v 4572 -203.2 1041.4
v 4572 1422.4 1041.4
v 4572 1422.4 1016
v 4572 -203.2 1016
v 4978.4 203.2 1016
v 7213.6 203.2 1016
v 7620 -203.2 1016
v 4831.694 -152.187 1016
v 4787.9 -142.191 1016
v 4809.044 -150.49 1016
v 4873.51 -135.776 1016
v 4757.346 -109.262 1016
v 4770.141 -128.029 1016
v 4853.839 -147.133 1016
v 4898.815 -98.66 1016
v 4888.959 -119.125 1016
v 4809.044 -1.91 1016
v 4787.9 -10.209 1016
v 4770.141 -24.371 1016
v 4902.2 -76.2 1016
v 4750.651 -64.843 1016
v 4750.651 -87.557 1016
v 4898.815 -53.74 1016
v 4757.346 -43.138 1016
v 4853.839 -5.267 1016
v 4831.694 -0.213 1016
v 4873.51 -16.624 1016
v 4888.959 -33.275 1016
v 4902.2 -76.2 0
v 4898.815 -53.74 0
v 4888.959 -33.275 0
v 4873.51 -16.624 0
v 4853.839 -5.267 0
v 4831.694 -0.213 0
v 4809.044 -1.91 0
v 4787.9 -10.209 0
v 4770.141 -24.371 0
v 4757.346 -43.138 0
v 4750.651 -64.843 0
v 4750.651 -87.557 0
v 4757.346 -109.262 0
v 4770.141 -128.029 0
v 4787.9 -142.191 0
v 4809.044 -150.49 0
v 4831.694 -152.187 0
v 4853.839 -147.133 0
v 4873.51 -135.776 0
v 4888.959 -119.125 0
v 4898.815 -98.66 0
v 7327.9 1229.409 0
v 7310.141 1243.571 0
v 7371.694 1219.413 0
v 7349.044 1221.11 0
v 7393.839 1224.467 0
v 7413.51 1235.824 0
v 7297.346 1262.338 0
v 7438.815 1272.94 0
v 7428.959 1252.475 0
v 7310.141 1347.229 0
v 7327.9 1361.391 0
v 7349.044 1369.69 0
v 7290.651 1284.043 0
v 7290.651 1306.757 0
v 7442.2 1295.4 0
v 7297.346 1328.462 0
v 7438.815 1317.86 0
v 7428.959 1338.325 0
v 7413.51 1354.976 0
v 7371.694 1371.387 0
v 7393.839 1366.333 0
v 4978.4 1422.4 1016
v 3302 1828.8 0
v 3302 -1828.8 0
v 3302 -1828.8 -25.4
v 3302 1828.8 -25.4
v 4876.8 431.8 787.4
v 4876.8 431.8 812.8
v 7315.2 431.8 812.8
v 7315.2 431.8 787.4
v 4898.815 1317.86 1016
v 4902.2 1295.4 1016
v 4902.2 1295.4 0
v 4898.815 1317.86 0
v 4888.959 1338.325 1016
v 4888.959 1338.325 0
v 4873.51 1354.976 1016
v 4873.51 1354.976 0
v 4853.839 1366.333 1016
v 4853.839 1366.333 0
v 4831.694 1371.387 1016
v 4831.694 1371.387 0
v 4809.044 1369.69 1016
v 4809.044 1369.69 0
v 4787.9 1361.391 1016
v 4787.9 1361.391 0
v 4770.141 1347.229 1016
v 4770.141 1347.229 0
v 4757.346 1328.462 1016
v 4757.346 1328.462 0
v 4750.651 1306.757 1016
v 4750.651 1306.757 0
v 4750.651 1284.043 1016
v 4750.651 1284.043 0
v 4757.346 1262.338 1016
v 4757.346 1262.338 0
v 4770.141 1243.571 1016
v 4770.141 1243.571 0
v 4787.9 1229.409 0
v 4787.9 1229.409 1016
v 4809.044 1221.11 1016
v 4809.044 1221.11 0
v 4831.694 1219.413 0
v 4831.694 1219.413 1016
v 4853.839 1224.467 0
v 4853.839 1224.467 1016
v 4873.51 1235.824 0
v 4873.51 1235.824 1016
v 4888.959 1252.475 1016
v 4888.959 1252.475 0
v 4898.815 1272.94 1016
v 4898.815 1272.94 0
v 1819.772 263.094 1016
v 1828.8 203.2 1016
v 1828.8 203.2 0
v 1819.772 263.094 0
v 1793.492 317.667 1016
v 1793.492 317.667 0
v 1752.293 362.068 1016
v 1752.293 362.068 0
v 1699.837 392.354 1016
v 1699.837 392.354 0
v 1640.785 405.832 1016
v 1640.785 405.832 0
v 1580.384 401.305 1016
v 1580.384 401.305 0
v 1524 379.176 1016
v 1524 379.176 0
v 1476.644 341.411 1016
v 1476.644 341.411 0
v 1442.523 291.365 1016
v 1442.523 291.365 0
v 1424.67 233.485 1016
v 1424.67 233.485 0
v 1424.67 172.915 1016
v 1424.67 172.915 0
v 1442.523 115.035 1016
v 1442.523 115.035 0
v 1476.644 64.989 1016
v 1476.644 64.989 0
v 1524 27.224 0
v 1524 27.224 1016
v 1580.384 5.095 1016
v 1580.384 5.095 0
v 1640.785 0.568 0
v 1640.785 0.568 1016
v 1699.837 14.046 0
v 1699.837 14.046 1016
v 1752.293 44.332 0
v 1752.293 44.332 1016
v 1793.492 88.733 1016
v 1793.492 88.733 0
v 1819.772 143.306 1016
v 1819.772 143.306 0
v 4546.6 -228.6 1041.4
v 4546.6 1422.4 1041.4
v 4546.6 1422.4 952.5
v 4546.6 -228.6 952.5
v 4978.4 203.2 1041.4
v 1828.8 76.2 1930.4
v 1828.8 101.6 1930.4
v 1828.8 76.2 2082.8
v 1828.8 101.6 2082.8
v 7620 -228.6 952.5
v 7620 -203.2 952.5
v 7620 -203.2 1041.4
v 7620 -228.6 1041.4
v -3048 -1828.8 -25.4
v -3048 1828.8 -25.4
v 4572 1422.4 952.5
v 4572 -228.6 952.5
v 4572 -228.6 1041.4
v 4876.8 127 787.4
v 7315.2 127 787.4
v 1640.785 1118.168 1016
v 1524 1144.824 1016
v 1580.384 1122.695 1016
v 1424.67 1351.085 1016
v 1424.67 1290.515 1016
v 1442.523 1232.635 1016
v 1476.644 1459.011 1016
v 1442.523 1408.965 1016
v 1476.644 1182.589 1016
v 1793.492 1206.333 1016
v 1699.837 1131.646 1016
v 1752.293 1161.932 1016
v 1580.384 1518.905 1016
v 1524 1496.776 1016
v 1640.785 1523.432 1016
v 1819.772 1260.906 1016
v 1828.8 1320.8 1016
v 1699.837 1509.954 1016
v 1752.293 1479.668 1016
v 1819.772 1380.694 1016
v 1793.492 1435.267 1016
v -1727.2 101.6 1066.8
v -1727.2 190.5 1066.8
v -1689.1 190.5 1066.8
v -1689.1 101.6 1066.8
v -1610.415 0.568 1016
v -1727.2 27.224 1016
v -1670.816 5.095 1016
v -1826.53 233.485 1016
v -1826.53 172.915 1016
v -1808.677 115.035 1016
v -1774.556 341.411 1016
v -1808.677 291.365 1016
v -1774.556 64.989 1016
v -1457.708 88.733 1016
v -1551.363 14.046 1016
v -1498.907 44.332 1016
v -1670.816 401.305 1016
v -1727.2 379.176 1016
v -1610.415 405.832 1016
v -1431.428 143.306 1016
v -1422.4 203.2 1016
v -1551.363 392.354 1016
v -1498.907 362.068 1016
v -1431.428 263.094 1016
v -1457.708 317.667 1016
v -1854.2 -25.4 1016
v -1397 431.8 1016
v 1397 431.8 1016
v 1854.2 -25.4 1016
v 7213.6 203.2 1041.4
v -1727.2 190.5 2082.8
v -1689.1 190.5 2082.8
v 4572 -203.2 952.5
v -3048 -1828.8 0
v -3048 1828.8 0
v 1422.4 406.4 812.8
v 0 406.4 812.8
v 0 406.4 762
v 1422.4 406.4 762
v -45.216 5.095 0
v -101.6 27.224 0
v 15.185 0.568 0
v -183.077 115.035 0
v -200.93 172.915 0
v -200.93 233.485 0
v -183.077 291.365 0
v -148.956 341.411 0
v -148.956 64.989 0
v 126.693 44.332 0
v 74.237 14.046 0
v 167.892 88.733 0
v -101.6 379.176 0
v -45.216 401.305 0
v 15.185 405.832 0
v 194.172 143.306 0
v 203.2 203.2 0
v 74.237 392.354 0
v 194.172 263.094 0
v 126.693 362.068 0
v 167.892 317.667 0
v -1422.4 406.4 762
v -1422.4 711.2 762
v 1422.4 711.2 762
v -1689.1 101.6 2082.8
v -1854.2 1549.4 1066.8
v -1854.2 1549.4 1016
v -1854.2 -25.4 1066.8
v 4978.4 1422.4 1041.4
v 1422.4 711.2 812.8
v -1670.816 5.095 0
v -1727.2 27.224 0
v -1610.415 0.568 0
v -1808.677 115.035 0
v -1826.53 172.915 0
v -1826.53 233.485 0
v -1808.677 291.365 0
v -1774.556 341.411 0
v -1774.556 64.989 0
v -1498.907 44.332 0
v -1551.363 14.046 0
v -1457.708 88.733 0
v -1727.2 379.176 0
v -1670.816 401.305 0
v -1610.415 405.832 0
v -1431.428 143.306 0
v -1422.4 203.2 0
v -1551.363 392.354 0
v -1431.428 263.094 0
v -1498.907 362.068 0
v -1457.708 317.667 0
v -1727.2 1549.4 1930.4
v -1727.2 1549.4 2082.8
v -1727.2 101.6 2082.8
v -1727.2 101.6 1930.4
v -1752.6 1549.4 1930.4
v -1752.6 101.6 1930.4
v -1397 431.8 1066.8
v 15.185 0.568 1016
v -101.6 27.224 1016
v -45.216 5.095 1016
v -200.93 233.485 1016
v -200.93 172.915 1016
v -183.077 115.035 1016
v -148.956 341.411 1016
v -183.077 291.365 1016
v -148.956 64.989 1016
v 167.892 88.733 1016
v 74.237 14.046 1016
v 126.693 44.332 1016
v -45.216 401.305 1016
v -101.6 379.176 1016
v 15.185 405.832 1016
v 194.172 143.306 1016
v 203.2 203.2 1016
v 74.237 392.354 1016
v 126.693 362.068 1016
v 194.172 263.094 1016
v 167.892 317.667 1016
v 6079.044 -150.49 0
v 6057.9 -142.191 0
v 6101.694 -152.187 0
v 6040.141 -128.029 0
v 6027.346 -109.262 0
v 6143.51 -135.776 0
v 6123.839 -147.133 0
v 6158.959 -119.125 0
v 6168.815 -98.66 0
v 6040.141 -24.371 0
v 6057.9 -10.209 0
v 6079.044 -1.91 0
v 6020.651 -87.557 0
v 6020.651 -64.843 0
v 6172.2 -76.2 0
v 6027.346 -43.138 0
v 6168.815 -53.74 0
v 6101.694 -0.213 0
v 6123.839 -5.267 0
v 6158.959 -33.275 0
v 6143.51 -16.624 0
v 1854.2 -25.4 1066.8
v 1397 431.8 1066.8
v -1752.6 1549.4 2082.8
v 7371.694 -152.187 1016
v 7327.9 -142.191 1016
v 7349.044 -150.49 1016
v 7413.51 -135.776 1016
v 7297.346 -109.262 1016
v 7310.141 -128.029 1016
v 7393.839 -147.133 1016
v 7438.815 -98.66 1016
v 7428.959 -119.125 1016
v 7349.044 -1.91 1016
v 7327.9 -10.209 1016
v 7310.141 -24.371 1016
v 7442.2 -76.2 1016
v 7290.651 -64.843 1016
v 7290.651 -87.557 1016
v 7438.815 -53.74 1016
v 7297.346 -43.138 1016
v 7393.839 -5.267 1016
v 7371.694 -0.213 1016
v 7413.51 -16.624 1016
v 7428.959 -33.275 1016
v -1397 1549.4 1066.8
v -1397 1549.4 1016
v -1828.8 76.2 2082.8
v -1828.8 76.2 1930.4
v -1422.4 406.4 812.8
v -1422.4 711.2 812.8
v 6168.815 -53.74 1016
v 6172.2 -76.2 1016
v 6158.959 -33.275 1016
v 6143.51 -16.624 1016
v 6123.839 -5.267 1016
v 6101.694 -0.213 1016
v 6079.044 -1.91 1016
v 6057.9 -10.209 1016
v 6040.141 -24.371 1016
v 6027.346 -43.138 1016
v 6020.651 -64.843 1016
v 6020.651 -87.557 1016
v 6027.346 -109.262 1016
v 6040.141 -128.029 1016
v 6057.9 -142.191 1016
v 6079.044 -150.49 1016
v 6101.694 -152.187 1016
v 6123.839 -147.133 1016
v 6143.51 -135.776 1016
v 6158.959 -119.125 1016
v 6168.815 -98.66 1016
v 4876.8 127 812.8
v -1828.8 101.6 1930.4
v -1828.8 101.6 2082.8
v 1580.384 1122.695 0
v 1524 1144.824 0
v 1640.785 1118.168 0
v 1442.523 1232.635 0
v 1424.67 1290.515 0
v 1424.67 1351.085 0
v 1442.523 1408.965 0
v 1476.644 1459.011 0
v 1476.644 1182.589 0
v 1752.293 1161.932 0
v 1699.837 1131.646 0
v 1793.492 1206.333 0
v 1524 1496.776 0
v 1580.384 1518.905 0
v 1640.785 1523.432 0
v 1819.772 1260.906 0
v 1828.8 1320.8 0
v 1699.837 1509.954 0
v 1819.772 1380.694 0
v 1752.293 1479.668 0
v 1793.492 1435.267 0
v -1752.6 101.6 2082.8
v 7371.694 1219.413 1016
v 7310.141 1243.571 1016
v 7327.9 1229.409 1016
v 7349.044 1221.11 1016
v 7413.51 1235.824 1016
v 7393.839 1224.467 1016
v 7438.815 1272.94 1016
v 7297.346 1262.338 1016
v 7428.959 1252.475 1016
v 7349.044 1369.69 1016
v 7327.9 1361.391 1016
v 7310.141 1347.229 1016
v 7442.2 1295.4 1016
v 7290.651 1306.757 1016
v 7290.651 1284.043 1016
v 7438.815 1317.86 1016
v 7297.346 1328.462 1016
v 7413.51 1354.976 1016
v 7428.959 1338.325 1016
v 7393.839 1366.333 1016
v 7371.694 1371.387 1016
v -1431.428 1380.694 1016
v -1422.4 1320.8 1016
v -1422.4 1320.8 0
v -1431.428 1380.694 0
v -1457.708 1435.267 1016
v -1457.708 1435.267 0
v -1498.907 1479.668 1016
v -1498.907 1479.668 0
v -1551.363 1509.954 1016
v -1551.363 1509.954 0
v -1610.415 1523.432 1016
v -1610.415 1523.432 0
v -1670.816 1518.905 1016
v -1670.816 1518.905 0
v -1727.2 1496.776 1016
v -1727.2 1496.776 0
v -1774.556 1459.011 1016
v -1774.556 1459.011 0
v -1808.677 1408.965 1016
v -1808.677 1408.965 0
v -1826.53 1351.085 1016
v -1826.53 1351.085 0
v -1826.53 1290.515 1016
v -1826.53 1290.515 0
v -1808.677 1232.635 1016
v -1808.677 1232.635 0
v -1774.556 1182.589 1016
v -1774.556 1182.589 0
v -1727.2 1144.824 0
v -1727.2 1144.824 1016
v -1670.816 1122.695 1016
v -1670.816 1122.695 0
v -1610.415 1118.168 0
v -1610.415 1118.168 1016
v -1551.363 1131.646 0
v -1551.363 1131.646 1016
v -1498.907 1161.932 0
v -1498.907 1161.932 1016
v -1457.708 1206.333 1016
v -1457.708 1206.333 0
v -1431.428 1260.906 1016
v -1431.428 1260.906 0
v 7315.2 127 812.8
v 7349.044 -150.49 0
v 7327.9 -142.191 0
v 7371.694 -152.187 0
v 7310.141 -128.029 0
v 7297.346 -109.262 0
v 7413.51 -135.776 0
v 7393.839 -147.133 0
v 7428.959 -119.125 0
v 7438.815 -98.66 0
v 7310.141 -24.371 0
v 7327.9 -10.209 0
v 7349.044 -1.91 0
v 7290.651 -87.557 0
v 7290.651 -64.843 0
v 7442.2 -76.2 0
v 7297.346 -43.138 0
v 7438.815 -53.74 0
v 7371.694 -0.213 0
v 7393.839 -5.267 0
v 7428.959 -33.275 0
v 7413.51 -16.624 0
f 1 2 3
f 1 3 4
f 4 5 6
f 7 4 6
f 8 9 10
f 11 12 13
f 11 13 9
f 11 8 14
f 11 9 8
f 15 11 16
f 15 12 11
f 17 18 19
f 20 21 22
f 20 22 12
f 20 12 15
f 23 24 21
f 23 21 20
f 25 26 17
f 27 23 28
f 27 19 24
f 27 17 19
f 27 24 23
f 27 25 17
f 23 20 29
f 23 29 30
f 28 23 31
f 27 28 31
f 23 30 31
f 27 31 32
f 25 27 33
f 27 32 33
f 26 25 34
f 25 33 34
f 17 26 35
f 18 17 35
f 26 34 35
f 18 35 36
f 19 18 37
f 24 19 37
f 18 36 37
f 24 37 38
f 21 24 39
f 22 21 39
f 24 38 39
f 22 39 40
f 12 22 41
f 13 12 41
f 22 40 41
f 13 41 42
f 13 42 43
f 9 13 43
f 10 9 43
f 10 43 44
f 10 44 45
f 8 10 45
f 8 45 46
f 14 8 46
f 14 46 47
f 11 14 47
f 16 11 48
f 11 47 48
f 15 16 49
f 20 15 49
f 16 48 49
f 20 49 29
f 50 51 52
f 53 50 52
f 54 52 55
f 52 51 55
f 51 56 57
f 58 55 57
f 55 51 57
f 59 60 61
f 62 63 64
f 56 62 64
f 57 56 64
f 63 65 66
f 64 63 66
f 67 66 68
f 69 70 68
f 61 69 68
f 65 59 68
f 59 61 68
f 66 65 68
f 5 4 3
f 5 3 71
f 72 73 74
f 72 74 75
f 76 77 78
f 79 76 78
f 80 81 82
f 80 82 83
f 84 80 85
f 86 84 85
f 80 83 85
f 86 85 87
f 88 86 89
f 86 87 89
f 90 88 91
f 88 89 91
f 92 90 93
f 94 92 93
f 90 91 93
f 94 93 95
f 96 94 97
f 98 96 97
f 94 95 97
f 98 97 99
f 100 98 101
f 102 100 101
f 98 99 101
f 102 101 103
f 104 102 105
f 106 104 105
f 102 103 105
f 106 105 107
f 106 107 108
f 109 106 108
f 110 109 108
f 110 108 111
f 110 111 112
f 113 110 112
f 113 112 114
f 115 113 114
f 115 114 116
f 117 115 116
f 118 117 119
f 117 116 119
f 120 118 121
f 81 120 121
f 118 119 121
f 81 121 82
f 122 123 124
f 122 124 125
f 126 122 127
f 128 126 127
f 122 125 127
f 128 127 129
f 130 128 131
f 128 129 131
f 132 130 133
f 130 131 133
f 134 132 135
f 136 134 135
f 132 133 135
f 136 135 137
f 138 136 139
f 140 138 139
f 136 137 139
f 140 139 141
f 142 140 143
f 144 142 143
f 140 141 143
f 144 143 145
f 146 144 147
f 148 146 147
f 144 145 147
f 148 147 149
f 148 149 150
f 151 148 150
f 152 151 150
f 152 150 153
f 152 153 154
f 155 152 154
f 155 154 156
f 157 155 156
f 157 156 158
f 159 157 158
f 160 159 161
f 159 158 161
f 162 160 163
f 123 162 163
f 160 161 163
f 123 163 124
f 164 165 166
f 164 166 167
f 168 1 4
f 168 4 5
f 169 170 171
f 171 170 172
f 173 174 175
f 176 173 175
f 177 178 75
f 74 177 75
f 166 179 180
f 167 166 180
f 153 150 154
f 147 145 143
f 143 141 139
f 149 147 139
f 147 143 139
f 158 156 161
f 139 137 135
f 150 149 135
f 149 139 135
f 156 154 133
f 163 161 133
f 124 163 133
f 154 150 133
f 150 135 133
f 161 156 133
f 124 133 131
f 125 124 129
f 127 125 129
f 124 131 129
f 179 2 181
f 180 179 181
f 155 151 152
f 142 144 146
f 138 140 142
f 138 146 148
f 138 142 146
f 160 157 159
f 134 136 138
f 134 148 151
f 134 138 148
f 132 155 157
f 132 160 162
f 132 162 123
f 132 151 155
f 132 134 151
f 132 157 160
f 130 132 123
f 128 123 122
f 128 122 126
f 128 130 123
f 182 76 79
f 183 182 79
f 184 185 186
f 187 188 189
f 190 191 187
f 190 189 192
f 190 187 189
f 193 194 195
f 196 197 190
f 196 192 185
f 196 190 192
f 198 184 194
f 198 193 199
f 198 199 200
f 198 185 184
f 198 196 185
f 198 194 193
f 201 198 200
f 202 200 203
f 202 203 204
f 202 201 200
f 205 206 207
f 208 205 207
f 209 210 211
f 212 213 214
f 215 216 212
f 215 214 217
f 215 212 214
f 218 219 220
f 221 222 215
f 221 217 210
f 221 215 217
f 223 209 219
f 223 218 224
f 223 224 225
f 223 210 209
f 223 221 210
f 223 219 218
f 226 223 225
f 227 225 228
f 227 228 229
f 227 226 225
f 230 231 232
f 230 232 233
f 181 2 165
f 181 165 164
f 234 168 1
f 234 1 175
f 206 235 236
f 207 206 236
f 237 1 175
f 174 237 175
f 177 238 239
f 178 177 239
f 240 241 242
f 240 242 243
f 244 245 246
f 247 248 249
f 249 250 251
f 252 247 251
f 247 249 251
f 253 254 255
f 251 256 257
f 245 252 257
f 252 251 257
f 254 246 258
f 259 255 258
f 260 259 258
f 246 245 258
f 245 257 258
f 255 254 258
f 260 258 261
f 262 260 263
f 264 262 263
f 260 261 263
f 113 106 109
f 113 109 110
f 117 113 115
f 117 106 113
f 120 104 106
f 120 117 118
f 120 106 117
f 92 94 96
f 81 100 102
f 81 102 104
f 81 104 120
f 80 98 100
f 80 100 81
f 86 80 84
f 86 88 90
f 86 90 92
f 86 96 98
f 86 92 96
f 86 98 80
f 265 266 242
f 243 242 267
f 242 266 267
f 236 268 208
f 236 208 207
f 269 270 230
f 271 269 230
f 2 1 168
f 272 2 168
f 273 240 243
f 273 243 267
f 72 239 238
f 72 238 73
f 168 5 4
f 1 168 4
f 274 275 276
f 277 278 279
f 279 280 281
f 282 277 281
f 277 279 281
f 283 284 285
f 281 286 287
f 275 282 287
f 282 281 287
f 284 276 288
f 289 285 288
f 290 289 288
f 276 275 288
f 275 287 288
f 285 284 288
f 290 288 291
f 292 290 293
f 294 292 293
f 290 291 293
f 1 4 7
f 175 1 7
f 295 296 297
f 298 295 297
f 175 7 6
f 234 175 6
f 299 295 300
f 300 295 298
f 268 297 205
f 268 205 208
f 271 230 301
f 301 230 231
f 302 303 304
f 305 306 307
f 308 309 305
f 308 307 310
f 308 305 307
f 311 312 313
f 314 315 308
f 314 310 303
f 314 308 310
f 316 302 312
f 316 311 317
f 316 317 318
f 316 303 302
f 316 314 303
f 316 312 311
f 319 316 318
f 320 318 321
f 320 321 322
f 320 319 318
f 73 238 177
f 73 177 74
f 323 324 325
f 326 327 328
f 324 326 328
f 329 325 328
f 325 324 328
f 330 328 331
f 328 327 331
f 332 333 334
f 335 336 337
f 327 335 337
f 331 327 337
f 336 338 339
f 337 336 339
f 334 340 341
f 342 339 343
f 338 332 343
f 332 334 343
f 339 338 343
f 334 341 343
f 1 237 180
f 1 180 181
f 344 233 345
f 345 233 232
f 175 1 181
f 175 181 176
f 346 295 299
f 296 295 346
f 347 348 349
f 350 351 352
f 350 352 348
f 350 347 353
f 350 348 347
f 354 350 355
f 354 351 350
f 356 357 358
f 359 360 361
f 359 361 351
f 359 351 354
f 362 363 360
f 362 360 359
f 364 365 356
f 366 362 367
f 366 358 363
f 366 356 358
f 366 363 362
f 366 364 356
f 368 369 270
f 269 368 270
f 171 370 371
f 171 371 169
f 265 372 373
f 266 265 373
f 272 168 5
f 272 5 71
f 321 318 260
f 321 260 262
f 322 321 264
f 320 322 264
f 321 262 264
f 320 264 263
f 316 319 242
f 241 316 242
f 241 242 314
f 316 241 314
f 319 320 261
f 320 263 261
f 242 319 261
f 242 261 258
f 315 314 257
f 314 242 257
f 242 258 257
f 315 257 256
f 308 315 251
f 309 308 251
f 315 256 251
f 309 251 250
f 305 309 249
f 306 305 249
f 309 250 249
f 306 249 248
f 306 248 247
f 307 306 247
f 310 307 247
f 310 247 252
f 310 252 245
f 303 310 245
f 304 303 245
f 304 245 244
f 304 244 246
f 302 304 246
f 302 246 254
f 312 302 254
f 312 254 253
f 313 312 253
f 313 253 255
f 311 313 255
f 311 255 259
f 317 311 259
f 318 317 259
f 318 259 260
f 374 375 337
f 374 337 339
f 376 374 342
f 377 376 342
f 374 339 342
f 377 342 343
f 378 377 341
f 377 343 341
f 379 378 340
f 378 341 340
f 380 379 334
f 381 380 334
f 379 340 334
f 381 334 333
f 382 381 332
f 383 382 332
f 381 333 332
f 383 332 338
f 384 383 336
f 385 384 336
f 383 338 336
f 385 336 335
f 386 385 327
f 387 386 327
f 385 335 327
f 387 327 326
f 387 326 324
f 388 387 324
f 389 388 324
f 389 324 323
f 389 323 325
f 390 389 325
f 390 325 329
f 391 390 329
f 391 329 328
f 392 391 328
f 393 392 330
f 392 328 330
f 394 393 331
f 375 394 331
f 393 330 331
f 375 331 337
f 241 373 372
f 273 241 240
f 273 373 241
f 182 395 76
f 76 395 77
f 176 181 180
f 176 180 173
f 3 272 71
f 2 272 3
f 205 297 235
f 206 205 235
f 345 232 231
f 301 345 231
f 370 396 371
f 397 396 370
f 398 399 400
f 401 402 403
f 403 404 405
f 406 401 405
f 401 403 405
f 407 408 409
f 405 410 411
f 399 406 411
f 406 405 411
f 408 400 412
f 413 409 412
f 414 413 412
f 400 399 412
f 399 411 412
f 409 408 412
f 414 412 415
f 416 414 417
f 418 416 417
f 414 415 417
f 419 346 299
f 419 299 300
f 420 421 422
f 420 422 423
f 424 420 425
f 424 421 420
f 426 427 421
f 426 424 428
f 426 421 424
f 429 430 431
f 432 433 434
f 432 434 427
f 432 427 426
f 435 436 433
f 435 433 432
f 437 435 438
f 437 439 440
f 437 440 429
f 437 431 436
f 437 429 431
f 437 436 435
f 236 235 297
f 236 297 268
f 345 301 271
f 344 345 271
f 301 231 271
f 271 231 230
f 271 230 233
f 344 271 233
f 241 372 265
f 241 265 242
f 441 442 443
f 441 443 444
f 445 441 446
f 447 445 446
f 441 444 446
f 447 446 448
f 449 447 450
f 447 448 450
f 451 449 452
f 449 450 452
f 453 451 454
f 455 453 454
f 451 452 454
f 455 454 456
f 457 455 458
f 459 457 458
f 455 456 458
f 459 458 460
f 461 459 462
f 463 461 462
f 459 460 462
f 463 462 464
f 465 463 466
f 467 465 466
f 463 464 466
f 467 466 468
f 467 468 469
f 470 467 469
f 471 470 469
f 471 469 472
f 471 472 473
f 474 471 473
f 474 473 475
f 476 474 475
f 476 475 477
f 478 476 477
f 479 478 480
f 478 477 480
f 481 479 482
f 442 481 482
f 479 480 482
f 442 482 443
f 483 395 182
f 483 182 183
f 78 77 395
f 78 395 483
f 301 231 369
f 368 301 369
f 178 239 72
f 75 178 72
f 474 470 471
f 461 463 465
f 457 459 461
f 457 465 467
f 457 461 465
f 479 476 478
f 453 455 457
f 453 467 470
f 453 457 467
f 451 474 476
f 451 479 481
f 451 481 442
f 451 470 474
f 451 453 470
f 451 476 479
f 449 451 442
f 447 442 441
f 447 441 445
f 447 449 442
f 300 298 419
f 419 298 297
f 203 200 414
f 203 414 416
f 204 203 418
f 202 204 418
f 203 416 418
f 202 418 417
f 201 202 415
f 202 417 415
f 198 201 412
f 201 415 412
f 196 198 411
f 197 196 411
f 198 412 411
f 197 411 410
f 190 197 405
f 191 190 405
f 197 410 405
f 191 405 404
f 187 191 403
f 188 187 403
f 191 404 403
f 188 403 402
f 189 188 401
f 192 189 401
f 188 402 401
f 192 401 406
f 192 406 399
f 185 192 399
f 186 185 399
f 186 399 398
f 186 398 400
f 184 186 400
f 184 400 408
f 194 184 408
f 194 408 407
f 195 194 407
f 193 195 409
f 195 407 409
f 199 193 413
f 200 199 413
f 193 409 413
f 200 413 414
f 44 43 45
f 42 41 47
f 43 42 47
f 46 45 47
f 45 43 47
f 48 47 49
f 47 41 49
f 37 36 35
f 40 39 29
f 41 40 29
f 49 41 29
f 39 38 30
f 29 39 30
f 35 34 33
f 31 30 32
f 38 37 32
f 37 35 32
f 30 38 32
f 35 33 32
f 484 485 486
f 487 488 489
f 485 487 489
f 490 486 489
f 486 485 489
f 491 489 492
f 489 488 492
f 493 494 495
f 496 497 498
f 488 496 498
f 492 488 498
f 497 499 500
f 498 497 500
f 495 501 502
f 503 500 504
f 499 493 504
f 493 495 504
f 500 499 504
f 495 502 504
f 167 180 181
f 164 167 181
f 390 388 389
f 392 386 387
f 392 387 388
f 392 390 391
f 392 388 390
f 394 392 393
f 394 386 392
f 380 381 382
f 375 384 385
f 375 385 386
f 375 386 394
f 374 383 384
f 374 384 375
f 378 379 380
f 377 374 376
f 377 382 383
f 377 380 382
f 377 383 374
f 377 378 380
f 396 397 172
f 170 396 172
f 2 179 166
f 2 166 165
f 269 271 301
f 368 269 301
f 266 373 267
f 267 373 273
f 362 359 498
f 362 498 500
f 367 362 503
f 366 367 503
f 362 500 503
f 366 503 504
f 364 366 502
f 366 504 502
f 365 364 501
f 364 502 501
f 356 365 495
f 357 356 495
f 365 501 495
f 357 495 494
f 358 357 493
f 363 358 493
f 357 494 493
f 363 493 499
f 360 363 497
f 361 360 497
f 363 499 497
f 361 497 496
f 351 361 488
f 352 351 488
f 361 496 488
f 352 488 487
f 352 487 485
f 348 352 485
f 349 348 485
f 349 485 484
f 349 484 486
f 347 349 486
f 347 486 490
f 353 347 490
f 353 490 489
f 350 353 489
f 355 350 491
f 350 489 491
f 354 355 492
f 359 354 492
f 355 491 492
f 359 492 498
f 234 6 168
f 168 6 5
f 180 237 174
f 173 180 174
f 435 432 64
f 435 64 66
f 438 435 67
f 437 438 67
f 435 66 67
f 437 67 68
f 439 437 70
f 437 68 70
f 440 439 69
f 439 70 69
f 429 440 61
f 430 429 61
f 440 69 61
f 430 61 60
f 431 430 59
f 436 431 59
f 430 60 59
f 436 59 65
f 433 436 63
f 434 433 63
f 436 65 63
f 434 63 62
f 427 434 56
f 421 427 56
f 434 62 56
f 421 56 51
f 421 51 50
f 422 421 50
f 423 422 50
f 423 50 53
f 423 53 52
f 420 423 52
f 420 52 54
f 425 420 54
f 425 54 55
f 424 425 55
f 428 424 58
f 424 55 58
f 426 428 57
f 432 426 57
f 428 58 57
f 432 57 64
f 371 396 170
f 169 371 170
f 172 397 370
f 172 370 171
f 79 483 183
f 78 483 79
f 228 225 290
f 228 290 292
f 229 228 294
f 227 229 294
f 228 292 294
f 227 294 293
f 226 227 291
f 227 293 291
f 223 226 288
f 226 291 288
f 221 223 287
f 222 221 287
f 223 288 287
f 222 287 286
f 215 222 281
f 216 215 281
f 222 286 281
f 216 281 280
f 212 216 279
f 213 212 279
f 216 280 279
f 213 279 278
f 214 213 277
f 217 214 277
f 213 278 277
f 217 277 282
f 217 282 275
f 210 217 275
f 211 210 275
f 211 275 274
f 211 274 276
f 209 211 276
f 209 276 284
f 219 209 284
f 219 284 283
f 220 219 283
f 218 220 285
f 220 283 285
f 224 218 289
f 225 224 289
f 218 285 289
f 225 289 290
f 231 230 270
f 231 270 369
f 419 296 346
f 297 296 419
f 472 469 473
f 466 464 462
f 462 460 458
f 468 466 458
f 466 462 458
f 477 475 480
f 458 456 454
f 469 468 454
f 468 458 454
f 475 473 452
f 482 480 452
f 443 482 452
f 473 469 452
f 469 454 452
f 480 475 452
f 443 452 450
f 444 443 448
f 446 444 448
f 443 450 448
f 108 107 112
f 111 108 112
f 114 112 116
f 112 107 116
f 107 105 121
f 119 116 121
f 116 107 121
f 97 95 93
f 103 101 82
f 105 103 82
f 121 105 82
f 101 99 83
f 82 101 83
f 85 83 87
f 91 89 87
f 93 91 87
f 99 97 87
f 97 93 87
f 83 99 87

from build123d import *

# Parameters (mm, degrees)
F0_W      = 6350
F0_H      = 3657.6
F1_DEPTH  = 25.4
F2_R      = 203.2
F3_DEPTH  = 1016
F6_DEPTH  = 50.8
F8_DEPTH  = 50.8
F10_W     = 2844.8
F10_H     = 304.8
F11_DEPTH = 50.8
F13_W     = 38.1
F13_H     = 88.9
F14_DEPTH = 1016
F15_W     = 3657.6
F15_H     = 152.4
F16_DEPTH = 25.4
F17_W     = 1447.8
F17_H     = 152.4
F18_DEPTH = 25.4
F19_R     = 76.2
F20_DEPTH = 1016
F22_DEPTH = 25.4
F23_W     = 2438.4
F23_H     = 304.8
F24_DEPTH = 25.4
F25_W     = 3048
F25_H     = 88.9
F26_DEPTH = 25.4
F28_DEPTH = 25.4
F29_W     = 1651
F29_H     = 88.9
F30_DEPTH = 25.4


with BuildPart() as f1:
    # F0 (on Top) → F1 (new body)
    with BuildSketch(Plane.XY):
        with Locations((127, 0)):
            Rectangle(F0_W, F0_H)
    extrude(amount=-F1_DEPTH)


with BuildPart() as f3:
    # F2 (on Top) → F3 (new body)
    with BuildSketch(Plane.XY):
        with Locations((0, 203.2)):
            Circle(F2_R)
    extrude(amount=F3_DEPTH)

    # F10 (on offset) → F11 (join)
    with BuildSketch(Plane.XY.offset(812.8)):
        with Locations((0, 558.8)):
            Rectangle(F10_W, F10_H)
    extrude(amount=-F11_DEPTH)


with BuildPart() as f3b:
    # F2 (on Top) → F3, piece 2 (new body)
    with BuildSketch(Plane.XY):
        with Locations((1625.6, 203.2)):
            Circle(F2_R)
    extrude(amount=F3_DEPTH)


with BuildPart() as f3c:
    # F2 (on Top) → F3, piece 3 (new body)
    with BuildSketch(Plane.XY):
        with Locations((-1625.6, 203.2)):
            Circle(F2_R)
    extrude(amount=F3_DEPTH)


with BuildPart() as f3d:
    # F2 (on Top) → F3, piece 4 (new body)
    with BuildSketch(Plane.XY):
        with Locations((-1625.6, 1320.8)):
            Circle(F2_R)
    extrude(amount=F3_DEPTH)


with BuildPart() as f3e:
    # F2 (on Top) → F3, piece 5 (new body)
    with BuildSketch(Plane.XY):
        with Locations((1625.6, 1320.8)):
            Circle(F2_R)
    extrude(amount=F3_DEPTH)


with BuildPart() as f6:
    # F5 (on offset) → F6 (new body)
    with BuildSketch(Plane.XY.offset(1016)):
        Polygon((-1397, 431.8), (-1854.2, -25.4), (1854.2, -25.4), (1397, 431.8), align=None)
    extrude(amount=F6_DEPTH)


with BuildPart() as f8:
    # F7 (on offset) → F8 (new body)
    with BuildSketch(Plane.XY.offset(1016)):
        Polygon((-1854.2, -25.4), (-1397, 431.8), (-1397, 1549.4), (-1854.2, 1549.4), align=None)
    extrude(amount=F8_DEPTH)


with BuildPart() as f14:
    # F13 (on offset) → F14 (new body)
    with BuildSketch(Plane.XY.offset(1066.8)):
        with Locations((-1708.15, 146.05)):
            Rectangle(F13_W, F13_H)
    extrude(amount=F14_DEPTH)


with BuildPart() as f16:
    # F15 (on face) → F16 (new body)
    with BuildSketch(Plane.XZ.offset(-101.6)):
        with Locations((0, 2006.6)):
            Rectangle(F15_W, F15_H)
    extrude(amount=F16_DEPTH)


with BuildPart() as f18:
    # F17 (on face) → F18 (new body)
    with BuildSketch(Plane(origin=(-1727.2, 0, 0), x_dir=(0, -1, 0), z_dir=(-1, 0, 0))):
        with Locations((-825.5, 2006.6)):
            Rectangle(F17_W, F17_H)
    extrude(amount=F18_DEPTH)


with BuildPart() as f20:
    # F19 (on Top) → F20 (new body)
    with BuildSketch(Plane.XY):
        with Locations((6096, -76.2)):
            Circle(F19_R)
    extrude(amount=F20_DEPTH)


with BuildPart() as f20b:
    # F19 (on Top) → F20, piece 2 (new body)
    with BuildSketch(Plane.XY):
        with Locations((4826, -76.2)):
            Circle(F19_R)
    extrude(amount=F20_DEPTH)


with BuildPart() as f20c:
    # F19 (on Top) → F20, piece 3 (new body)
    with BuildSketch(Plane.XY):
        with Locations((7366, -76.2)):
            Circle(F19_R)
    extrude(amount=F20_DEPTH)


with BuildPart() as f20d:
    # F19 (on Top) → F20, piece 4 (new body)
    with BuildSketch(Plane.XY):
        with Locations((4826, 1295.4)):
            Circle(F19_R)
    extrude(amount=F20_DEPTH)


with BuildPart() as f20e:
    # F19 (on Top) → F20, piece 5 (new body)
    with BuildSketch(Plane.XY):
        with Locations((7366, 1295.4)):
            Circle(F19_R)
    extrude(amount=F20_DEPTH)


with BuildPart() as f22:
    # F21 (on offset) → F22 (new body)
    with BuildSketch(Plane.XY.offset(1016)):
        Polygon((4978.4, 203.2), (4572, -203.2), (7620, -203.2), (7213.6, 203.2), align=None)
    extrude(amount=F22_DEPTH)


with BuildPart() as f24:
    # F23 (on offset) → F24 (new body)
    with BuildSketch(Plane.XY.offset(812.8)):
        with Locations((6096, 279.4)):
            Rectangle(F23_W, F23_H)
    extrude(amount=-F24_DEPTH)


with BuildPart() as f26:
    # F25 (on face) → F26 (new body)
    with BuildSketch(Plane.XZ.offset(203.2)):
        with Locations((6096, 996.95)):
            Rectangle(F25_W, F25_H)
    extrude(amount=F26_DEPTH)


with BuildPart() as f28:
    # F27 (on face) → F28 (new body)
    with BuildSketch(Plane.XY.offset(1041.4)):
        Polygon((4572, -203.2), (4978.4, 203.2), (4978.4, 1422.4), (4572, 1422.4), align=None)
    extrude(amount=-F28_DEPTH)


with BuildPart() as f30:
    # F29 (on face) → F30 (new body)
    with BuildSketch(Plane(origin=(4572, 0, 0), x_dir=(0, -1, 0), z_dir=(-1, 0, 0))):
        with Locations((-596.9, 996.95)):
            Rectangle(F29_W, F29_H)
    extrude(amount=F30_DEPTH)


solid = Compound([f1.part, f3.part, f3b.part, f3c.part, f3d.part, f3e.part, f6.part, f8.part, f14.part, f16.part, f18.part, f20.part, f20b.part, f20c.part, f20d.part, f20e.part, f22.part, f24.part, f26.part, f28.part, f30.part])
